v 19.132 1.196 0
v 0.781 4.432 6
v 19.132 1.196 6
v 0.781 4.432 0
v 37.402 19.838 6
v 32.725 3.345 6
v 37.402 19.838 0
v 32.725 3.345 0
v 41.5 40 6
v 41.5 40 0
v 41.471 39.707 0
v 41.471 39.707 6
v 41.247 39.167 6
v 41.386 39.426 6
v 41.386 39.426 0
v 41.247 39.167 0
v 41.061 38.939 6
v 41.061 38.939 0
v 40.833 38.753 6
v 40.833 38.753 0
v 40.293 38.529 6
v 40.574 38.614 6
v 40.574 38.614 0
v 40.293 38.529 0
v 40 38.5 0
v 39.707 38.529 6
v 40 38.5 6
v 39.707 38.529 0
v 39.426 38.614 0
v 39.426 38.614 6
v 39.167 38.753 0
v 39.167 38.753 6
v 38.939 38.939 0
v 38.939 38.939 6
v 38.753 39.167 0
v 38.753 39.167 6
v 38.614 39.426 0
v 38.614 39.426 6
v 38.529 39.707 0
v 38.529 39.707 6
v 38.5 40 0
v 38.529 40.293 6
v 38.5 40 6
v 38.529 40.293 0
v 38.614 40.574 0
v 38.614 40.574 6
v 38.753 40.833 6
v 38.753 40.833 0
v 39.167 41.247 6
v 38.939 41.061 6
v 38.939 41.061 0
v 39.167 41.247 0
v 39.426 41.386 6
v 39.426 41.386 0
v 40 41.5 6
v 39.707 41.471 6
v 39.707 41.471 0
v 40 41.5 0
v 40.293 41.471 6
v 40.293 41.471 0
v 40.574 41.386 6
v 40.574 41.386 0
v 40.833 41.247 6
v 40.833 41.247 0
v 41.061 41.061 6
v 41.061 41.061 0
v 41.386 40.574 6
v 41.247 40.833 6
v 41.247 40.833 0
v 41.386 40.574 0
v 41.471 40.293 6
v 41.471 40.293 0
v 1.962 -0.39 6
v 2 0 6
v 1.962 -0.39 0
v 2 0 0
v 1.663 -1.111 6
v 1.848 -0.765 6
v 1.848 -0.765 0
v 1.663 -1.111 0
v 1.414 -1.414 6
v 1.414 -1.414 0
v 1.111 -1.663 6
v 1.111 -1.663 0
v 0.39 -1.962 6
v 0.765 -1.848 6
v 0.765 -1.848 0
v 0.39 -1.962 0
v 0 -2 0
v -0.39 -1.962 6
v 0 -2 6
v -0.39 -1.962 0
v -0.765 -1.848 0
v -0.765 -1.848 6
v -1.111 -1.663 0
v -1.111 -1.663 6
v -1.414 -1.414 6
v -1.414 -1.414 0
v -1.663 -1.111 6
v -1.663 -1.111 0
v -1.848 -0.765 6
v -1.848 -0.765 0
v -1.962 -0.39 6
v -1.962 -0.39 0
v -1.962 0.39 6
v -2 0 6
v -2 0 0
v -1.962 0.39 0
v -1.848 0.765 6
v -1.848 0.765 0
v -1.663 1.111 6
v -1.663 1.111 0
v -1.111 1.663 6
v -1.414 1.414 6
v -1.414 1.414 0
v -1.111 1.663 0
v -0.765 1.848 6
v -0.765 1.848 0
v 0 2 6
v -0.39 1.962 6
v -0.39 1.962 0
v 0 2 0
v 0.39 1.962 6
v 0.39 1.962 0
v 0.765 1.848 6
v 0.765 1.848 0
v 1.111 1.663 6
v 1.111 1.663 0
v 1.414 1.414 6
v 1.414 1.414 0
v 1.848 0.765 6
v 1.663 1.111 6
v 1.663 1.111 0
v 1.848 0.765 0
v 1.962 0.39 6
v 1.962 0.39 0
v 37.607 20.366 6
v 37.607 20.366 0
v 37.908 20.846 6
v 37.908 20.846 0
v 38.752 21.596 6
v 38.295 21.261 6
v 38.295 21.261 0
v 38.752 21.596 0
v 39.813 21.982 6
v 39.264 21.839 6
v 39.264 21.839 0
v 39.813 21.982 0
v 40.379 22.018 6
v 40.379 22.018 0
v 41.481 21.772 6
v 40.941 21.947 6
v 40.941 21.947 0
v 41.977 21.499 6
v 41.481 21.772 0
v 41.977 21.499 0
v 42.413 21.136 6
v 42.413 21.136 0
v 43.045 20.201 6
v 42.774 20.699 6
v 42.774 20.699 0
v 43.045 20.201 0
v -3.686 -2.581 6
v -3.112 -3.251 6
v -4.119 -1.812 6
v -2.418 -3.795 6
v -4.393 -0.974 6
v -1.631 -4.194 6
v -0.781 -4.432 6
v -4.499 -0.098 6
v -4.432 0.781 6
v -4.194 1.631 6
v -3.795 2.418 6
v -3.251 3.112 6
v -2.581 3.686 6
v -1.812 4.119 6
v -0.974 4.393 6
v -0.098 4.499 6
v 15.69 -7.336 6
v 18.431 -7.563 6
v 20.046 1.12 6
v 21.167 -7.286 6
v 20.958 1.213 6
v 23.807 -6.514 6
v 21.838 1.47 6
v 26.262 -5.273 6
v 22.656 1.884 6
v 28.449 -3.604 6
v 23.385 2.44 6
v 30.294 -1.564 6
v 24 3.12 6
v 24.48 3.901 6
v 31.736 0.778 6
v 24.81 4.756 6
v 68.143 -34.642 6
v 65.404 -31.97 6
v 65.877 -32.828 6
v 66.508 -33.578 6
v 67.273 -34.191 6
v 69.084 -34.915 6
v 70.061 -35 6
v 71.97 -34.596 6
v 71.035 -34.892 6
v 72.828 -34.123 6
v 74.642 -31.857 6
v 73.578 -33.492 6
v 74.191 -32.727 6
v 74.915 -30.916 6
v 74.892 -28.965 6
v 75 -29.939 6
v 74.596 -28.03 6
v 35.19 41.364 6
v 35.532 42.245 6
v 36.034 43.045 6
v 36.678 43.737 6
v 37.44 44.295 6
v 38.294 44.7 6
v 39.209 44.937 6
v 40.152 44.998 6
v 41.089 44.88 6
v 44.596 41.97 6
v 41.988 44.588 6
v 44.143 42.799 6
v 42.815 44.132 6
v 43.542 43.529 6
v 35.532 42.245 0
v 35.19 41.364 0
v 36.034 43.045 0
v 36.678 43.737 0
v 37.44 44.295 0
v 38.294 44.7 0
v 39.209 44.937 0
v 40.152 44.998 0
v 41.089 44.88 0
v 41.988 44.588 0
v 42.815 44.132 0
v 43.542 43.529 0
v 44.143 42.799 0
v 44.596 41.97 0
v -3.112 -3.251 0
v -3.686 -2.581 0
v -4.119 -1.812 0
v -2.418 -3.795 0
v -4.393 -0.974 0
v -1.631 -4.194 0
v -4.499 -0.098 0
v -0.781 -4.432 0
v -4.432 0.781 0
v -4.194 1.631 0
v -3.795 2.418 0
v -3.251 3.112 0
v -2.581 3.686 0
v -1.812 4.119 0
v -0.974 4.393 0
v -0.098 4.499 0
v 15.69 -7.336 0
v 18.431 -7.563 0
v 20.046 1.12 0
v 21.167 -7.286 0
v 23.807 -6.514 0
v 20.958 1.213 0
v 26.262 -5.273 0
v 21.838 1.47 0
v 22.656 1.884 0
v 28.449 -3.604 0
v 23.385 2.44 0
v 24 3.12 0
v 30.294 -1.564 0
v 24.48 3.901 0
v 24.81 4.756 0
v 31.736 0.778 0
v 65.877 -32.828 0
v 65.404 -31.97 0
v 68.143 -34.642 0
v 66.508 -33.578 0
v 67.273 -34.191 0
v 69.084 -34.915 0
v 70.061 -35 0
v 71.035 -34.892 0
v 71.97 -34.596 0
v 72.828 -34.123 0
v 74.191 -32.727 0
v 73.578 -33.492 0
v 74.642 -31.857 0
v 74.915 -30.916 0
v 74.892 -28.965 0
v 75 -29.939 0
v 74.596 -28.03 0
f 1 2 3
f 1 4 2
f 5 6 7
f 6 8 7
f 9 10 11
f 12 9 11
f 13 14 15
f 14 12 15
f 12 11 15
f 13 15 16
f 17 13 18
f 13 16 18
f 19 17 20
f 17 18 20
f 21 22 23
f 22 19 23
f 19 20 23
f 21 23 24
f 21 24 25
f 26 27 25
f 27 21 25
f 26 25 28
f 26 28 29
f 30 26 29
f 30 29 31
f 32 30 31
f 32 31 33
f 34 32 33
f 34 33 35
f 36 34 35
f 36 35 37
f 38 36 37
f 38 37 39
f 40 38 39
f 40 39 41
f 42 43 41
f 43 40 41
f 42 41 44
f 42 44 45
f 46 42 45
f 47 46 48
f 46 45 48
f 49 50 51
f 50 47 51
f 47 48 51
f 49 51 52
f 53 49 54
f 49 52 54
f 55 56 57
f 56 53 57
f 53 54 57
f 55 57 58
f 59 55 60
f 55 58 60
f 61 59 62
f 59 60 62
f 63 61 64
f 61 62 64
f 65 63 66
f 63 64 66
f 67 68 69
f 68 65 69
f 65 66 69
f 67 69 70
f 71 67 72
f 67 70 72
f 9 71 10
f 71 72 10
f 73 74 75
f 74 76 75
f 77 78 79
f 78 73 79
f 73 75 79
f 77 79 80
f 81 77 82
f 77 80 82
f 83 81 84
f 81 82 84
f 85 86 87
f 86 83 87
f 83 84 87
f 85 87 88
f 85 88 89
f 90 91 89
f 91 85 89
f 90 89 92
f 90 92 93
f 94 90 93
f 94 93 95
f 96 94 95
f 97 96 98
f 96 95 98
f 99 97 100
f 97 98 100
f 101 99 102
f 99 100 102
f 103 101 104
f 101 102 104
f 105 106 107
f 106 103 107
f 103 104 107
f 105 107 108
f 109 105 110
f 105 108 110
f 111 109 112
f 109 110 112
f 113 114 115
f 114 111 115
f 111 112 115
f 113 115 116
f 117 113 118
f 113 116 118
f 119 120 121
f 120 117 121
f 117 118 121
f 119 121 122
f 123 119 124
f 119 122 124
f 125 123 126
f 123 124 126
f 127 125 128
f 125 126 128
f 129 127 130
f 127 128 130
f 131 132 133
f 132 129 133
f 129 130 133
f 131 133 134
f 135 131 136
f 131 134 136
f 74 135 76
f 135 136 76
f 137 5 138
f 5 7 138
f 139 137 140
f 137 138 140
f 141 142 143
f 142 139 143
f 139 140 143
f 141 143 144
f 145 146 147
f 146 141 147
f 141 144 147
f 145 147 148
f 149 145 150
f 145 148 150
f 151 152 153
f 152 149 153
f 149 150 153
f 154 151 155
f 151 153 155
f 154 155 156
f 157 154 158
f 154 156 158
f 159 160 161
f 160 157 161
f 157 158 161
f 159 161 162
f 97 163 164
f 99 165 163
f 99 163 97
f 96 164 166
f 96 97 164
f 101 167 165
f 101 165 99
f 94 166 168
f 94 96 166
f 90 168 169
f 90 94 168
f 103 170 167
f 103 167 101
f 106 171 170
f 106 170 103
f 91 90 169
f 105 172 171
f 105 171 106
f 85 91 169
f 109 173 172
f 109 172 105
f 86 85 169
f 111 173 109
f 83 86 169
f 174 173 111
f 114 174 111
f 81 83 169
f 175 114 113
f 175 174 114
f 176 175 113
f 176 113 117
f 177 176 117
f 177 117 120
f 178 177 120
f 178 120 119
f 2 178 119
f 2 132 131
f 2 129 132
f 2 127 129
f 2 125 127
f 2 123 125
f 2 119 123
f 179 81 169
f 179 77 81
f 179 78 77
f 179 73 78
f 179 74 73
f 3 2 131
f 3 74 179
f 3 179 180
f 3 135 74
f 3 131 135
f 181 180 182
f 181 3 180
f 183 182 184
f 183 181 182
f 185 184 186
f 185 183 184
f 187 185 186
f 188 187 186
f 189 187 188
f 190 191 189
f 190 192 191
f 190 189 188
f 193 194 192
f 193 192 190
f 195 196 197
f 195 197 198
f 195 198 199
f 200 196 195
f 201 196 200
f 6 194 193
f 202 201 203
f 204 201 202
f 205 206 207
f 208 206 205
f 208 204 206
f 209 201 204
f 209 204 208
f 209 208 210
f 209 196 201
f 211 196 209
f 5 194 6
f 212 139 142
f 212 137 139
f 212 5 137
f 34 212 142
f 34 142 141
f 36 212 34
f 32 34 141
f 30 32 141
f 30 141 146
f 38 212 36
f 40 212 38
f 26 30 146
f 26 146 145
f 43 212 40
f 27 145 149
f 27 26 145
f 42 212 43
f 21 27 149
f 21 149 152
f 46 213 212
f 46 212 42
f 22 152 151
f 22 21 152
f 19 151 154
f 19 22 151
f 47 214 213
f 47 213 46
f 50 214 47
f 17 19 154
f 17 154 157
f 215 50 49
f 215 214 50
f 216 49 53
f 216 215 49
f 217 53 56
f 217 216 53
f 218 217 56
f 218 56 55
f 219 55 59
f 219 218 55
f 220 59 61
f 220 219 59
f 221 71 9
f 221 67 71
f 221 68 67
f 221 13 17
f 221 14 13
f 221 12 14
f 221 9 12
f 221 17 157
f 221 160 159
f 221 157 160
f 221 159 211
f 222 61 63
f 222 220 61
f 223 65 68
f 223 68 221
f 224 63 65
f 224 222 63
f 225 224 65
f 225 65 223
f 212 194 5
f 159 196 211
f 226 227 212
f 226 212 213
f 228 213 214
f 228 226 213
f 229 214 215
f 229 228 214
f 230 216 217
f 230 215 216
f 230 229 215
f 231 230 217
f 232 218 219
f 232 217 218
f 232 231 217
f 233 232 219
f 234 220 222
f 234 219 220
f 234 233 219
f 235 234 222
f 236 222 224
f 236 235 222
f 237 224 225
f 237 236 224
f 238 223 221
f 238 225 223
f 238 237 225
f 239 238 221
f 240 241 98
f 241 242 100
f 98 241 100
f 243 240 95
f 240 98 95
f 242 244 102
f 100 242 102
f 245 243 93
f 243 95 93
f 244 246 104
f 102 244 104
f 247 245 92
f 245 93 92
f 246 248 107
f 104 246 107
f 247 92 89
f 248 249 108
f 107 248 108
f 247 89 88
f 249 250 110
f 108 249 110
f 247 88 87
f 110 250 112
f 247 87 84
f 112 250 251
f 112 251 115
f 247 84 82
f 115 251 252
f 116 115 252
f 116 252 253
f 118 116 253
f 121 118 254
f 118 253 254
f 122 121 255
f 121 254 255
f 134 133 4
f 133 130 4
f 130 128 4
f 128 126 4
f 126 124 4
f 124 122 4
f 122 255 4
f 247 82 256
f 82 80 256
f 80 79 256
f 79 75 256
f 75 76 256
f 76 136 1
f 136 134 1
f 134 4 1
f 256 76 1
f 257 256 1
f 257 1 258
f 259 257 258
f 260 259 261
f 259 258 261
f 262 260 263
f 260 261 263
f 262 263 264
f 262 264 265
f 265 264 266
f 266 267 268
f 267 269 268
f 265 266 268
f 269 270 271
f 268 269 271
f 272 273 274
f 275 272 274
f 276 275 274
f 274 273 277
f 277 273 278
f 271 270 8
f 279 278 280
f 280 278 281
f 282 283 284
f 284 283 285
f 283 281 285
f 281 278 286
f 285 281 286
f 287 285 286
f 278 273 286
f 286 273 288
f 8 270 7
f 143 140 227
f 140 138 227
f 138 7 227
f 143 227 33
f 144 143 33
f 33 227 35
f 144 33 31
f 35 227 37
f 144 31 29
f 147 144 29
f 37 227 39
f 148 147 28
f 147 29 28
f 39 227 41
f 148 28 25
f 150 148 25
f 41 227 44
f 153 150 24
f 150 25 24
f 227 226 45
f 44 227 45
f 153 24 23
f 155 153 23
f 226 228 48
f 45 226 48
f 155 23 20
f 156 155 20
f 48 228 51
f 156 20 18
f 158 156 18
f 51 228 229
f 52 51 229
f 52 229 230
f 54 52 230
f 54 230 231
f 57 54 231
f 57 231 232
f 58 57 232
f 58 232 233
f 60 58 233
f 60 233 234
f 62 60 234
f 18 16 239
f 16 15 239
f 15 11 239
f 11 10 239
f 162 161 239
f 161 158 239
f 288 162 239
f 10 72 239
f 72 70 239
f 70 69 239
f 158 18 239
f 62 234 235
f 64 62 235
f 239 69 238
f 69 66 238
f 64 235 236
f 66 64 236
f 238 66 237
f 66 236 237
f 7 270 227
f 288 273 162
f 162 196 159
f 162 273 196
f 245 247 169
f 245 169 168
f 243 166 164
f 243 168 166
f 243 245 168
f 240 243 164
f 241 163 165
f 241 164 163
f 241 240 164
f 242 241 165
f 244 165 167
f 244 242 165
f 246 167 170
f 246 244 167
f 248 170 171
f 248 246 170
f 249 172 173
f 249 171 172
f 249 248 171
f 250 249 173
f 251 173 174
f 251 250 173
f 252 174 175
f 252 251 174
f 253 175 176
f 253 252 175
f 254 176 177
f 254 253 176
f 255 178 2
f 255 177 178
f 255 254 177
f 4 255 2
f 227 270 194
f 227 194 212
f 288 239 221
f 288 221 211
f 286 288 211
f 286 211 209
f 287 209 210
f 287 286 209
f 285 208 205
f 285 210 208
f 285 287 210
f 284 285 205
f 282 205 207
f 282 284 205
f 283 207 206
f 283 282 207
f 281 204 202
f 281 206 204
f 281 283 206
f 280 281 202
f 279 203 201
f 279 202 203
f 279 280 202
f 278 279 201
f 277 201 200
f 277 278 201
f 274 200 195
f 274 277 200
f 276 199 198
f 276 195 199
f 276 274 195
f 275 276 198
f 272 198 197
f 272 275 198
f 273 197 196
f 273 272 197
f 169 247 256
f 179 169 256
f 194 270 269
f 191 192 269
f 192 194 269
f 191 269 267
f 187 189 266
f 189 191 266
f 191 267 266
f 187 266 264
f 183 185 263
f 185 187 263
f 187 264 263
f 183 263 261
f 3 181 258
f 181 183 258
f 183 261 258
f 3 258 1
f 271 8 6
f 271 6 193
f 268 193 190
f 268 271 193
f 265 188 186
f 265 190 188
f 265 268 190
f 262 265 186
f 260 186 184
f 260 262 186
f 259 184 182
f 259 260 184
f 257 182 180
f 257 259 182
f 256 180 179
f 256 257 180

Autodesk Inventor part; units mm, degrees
ref_plane "YZ Plane" through (0, 0, 0) normal (1, 0, 0) x (0, 1, 0)
ref_plane "XZ Plane" through (0, 0, 0) normal (0, 1, 0) x (-1, 0, 0)
ref_plane "XY Plane" through (0, 0, 0) normal (0, 0, 1) x (1, 0, 0)
sketch "Sketch1" plane through (0, 0, 0) normal (0, 0, 1) x (1, 0, 0)
  circle A0 centre (0, 0) radius 2
  arc A1 (0.7814, 4.4316) -> (-0.7814, -4.4316) centre (0, 0) ccw
  arc A2 (44.5957, 41.9696) -> (35.1896, 41.3639) centre (40, 40) ccw
  line L0 (44.5957, 41.9696) -> (74.5957, -28.0304)
  arc A3 (65.4043, -31.9696) -> (74.5957, -28.0304) centre (70, -30) ccw
  circle A4 centre (40, 40) radius 1.5
  line L1 (0, 0) -> (46.8621, 0) construction
  line L2 (65.4043, -31.9696) -> (43.0454, 20.2011)
  line L3 (0.7814, 4.4316) -> (19.1318, 1.196)
  arc A5 (19.1318, 1.196) -> (24.8104, 4.7561) centre (20, 6.12) ccw
  line L4 (24.8104, 4.7561) -> (35.1896, 41.3639)
  line L5 (-0.7814, -4.4316) -> (15.6896, -7.3359)
  arc A6 (15.6896, -7.3359) -> (32.7255, 3.3446) centre (18.2943, 7.4362) ccw
  line L6 (32.7255, 3.3446) -> (37.4017, 19.8377)
  arc A7 (43.0454, 20.2011) -> (37.4017, 19.8377) centre (40.288, 19.0194) ccw
  dimension "d0" = 4
  dimension "d1" = 3
  dimension "d2" = 4.5
  dimension "d5" = 40
  dimension "d6" = 5
  dimension "d8" = 10
  dimension "d9" = 40
  dimension "d10" = 30
  dimension "d11" = 70
  dimension "d12" = 10
  dimension "d13" = 20
  dimension "d14" = 8
  dimension "d15" = 5
  dimension "d16" = 15
  dimension "d17" = 3
extrude "Extrusion1" add sketch "Sketch1" along normal blind 6
properties part number "Leg3"
